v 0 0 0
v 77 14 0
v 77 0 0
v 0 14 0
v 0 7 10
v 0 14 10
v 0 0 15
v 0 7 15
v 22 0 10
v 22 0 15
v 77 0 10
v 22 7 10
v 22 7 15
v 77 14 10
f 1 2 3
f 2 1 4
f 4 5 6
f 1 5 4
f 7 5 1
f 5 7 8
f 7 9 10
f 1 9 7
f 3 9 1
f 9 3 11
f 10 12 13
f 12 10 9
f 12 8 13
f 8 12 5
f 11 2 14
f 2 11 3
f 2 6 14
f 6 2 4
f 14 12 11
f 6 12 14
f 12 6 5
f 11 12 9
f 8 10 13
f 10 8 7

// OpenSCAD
translate([5.5, 3.5, 2.5]) color([0.7933250841302242, 0.0823729881966474, 0.6127831050407122]) cube([11, 7, 5], center=true);
translate([16.5, 3.5, 2.5]) color([0.4864442019691668, 0.6301473404114728, 0.8450775756715152]) cube([11, 7, 5], center=true);
translate([27.5, 3.5, 2.5]) color([0.24303562206185625, 0.7314892207908478, 0.11713429320851798]) cube([11, 7, 5], center=true);
translate([38.5, 3.5, 2.5]) color([0.22046053686782852, 0.7945829717105759, 0.33253614921965546]) cube([11, 7, 5], center=true);
translate([49.5, 3.5, 2.5]) color([0.8159130965336595, 0.1006075202160962, 0.14635848891230385]) cube([11, 7, 5], center=true);
translate([60.5, 3.5, 2.5]) color([0.6976706401912388, 0.04523406786561235, 0.5738660367891669]) cube([11, 7, 5], center=true);
translate([71.5, 3.5, 2.5]) color([0.9100160146990397, 0.534197968260724, 0.6805891325622565]) cube([11, 7, 5], center=true);
translate([5.5, 10.5, 2.5]) color([0.026696794662205203, 0.6349999099114583, 0.6063384177542189]) cube([11, 7, 5], center=true);
translate([16.5, 10.5, 2.5]) color([0.5759529480315407, 0.3912094093228269, 0.3701399403351875]) cube([11, 7, 5], center=true);
translate([27.5, 10.5, 2.5]) color([0.9805166506472687, 0.036392037611485795, 0.021636509855024078]) cube([11, 7, 5], center=true);
translate([38.5, 10.5, 2.5]) color([0.9610312802396112, 0.18497194139743833, 0.12389516442443171]) cube([11, 7, 5], center=true);
translate([49.5, 10.5, 2.5]) color([0.21057650988664645, 0.8007465903541809, 0.9369691586445807]) cube([11, 7, 5], center=true);
translate([60.5, 10.5, 2.5]) color([0.022782575668658378, 0.42561883196681716, 0.10150021937416975]) cube([11, 7, 5], center=true);
translate([71.5, 10.5, 2.5]) color([0.259919889792832, 0.22082927131631735, 0.6469257198353225]) cube([11, 7, 5], center=true);
translate([5.5, 3.5, 7.5]) color([0.3502939673965323, 0.18031790152968785, 0.5036365052098872]) cube([11, 7, 5], center=true);
translate([16.5, 3.5, 7.5]) color([0.03937870708469238, 0.10092124118896661, 0.9882351487225011]) cube([11, 7, 5], center=true);
translate([27.5, 3.5, 7.5]) color([0.19935579046706298, 0.35855530131160185, 0.7315983062253606]) cube([11, 7, 5], center=true);
translate([38.5, 3.5, 7.5]) color([0.8383265651934163, 0.9184820619953314, 0.16942460609746768]) cube([11, 7, 5], center=true);
translate([49.5, 3.5, 7.5]) color([0.6726405635730526, 0.9665489030431832, 0.05805094382649867]) cube([11, 7, 5], center=true);
translate([60.5, 3.5, 7.5]) color([0.6762017842993783, 0.8454245937016164, 0.342312541078584]) cube([11, 7, 5], center=true);
translate([71.5, 3.5, 7.5]) color([0.25068733928511167, 0.596791393469411, 0.44231403369907896]) cube([11, 7, 5], center=true);
translate([5.5, 10.5, 7.5]) color([0.17481948445144113, 0.47162541509628797, 0.40990539565755457]) cube([11, 7, 5], center=true);
translate([16.5, 10.5, 7.5]) color([0.5691127395242802, 0.5086001300626332, 0.3114460010002068]) cube([11, 7, 5], center=true);
translate([27.5, 10.5, 7.5]) color([0.35715168259026286, 0.837661174368979, 0.25093266482213705]) cube([11, 7, 5], center=true);
translate([38.5, 10.5, 7.5]) color([0.560600218853524, 0.012436318829314397, 0.7415743774106636]) cube([11, 7, 5], center=true);
translate([49.5, 10.5, 7.5]) color([0.3359165544734606, 0.04569649356841665, 0.28088316421834825]) cube([11, 7, 5], center=true);
translate([60.5, 10.5, 7.5]) color([0.24013040782635398, 0.9531293398277989, 0.35222556151550743]) cube([11, 7, 5], center=true);
translate([71.5, 10.5, 7.5]) color([0.2878779148564, 0.35920119725374633, 0.9469058356578911]) cube([11, 7, 5], center=true);
translate([5.5, 3.5, 12.5]) color([0.6337478522492526, 0.6210768456186673, 0.7156193503014563]) cube([11, 7, 5], center=true);
translate([16.5, 3.5, 12.5]) color([0.38801723531250565, 0.4144179882772473, 0.650832862263345]) cube([11, 7, 5], center=true);
